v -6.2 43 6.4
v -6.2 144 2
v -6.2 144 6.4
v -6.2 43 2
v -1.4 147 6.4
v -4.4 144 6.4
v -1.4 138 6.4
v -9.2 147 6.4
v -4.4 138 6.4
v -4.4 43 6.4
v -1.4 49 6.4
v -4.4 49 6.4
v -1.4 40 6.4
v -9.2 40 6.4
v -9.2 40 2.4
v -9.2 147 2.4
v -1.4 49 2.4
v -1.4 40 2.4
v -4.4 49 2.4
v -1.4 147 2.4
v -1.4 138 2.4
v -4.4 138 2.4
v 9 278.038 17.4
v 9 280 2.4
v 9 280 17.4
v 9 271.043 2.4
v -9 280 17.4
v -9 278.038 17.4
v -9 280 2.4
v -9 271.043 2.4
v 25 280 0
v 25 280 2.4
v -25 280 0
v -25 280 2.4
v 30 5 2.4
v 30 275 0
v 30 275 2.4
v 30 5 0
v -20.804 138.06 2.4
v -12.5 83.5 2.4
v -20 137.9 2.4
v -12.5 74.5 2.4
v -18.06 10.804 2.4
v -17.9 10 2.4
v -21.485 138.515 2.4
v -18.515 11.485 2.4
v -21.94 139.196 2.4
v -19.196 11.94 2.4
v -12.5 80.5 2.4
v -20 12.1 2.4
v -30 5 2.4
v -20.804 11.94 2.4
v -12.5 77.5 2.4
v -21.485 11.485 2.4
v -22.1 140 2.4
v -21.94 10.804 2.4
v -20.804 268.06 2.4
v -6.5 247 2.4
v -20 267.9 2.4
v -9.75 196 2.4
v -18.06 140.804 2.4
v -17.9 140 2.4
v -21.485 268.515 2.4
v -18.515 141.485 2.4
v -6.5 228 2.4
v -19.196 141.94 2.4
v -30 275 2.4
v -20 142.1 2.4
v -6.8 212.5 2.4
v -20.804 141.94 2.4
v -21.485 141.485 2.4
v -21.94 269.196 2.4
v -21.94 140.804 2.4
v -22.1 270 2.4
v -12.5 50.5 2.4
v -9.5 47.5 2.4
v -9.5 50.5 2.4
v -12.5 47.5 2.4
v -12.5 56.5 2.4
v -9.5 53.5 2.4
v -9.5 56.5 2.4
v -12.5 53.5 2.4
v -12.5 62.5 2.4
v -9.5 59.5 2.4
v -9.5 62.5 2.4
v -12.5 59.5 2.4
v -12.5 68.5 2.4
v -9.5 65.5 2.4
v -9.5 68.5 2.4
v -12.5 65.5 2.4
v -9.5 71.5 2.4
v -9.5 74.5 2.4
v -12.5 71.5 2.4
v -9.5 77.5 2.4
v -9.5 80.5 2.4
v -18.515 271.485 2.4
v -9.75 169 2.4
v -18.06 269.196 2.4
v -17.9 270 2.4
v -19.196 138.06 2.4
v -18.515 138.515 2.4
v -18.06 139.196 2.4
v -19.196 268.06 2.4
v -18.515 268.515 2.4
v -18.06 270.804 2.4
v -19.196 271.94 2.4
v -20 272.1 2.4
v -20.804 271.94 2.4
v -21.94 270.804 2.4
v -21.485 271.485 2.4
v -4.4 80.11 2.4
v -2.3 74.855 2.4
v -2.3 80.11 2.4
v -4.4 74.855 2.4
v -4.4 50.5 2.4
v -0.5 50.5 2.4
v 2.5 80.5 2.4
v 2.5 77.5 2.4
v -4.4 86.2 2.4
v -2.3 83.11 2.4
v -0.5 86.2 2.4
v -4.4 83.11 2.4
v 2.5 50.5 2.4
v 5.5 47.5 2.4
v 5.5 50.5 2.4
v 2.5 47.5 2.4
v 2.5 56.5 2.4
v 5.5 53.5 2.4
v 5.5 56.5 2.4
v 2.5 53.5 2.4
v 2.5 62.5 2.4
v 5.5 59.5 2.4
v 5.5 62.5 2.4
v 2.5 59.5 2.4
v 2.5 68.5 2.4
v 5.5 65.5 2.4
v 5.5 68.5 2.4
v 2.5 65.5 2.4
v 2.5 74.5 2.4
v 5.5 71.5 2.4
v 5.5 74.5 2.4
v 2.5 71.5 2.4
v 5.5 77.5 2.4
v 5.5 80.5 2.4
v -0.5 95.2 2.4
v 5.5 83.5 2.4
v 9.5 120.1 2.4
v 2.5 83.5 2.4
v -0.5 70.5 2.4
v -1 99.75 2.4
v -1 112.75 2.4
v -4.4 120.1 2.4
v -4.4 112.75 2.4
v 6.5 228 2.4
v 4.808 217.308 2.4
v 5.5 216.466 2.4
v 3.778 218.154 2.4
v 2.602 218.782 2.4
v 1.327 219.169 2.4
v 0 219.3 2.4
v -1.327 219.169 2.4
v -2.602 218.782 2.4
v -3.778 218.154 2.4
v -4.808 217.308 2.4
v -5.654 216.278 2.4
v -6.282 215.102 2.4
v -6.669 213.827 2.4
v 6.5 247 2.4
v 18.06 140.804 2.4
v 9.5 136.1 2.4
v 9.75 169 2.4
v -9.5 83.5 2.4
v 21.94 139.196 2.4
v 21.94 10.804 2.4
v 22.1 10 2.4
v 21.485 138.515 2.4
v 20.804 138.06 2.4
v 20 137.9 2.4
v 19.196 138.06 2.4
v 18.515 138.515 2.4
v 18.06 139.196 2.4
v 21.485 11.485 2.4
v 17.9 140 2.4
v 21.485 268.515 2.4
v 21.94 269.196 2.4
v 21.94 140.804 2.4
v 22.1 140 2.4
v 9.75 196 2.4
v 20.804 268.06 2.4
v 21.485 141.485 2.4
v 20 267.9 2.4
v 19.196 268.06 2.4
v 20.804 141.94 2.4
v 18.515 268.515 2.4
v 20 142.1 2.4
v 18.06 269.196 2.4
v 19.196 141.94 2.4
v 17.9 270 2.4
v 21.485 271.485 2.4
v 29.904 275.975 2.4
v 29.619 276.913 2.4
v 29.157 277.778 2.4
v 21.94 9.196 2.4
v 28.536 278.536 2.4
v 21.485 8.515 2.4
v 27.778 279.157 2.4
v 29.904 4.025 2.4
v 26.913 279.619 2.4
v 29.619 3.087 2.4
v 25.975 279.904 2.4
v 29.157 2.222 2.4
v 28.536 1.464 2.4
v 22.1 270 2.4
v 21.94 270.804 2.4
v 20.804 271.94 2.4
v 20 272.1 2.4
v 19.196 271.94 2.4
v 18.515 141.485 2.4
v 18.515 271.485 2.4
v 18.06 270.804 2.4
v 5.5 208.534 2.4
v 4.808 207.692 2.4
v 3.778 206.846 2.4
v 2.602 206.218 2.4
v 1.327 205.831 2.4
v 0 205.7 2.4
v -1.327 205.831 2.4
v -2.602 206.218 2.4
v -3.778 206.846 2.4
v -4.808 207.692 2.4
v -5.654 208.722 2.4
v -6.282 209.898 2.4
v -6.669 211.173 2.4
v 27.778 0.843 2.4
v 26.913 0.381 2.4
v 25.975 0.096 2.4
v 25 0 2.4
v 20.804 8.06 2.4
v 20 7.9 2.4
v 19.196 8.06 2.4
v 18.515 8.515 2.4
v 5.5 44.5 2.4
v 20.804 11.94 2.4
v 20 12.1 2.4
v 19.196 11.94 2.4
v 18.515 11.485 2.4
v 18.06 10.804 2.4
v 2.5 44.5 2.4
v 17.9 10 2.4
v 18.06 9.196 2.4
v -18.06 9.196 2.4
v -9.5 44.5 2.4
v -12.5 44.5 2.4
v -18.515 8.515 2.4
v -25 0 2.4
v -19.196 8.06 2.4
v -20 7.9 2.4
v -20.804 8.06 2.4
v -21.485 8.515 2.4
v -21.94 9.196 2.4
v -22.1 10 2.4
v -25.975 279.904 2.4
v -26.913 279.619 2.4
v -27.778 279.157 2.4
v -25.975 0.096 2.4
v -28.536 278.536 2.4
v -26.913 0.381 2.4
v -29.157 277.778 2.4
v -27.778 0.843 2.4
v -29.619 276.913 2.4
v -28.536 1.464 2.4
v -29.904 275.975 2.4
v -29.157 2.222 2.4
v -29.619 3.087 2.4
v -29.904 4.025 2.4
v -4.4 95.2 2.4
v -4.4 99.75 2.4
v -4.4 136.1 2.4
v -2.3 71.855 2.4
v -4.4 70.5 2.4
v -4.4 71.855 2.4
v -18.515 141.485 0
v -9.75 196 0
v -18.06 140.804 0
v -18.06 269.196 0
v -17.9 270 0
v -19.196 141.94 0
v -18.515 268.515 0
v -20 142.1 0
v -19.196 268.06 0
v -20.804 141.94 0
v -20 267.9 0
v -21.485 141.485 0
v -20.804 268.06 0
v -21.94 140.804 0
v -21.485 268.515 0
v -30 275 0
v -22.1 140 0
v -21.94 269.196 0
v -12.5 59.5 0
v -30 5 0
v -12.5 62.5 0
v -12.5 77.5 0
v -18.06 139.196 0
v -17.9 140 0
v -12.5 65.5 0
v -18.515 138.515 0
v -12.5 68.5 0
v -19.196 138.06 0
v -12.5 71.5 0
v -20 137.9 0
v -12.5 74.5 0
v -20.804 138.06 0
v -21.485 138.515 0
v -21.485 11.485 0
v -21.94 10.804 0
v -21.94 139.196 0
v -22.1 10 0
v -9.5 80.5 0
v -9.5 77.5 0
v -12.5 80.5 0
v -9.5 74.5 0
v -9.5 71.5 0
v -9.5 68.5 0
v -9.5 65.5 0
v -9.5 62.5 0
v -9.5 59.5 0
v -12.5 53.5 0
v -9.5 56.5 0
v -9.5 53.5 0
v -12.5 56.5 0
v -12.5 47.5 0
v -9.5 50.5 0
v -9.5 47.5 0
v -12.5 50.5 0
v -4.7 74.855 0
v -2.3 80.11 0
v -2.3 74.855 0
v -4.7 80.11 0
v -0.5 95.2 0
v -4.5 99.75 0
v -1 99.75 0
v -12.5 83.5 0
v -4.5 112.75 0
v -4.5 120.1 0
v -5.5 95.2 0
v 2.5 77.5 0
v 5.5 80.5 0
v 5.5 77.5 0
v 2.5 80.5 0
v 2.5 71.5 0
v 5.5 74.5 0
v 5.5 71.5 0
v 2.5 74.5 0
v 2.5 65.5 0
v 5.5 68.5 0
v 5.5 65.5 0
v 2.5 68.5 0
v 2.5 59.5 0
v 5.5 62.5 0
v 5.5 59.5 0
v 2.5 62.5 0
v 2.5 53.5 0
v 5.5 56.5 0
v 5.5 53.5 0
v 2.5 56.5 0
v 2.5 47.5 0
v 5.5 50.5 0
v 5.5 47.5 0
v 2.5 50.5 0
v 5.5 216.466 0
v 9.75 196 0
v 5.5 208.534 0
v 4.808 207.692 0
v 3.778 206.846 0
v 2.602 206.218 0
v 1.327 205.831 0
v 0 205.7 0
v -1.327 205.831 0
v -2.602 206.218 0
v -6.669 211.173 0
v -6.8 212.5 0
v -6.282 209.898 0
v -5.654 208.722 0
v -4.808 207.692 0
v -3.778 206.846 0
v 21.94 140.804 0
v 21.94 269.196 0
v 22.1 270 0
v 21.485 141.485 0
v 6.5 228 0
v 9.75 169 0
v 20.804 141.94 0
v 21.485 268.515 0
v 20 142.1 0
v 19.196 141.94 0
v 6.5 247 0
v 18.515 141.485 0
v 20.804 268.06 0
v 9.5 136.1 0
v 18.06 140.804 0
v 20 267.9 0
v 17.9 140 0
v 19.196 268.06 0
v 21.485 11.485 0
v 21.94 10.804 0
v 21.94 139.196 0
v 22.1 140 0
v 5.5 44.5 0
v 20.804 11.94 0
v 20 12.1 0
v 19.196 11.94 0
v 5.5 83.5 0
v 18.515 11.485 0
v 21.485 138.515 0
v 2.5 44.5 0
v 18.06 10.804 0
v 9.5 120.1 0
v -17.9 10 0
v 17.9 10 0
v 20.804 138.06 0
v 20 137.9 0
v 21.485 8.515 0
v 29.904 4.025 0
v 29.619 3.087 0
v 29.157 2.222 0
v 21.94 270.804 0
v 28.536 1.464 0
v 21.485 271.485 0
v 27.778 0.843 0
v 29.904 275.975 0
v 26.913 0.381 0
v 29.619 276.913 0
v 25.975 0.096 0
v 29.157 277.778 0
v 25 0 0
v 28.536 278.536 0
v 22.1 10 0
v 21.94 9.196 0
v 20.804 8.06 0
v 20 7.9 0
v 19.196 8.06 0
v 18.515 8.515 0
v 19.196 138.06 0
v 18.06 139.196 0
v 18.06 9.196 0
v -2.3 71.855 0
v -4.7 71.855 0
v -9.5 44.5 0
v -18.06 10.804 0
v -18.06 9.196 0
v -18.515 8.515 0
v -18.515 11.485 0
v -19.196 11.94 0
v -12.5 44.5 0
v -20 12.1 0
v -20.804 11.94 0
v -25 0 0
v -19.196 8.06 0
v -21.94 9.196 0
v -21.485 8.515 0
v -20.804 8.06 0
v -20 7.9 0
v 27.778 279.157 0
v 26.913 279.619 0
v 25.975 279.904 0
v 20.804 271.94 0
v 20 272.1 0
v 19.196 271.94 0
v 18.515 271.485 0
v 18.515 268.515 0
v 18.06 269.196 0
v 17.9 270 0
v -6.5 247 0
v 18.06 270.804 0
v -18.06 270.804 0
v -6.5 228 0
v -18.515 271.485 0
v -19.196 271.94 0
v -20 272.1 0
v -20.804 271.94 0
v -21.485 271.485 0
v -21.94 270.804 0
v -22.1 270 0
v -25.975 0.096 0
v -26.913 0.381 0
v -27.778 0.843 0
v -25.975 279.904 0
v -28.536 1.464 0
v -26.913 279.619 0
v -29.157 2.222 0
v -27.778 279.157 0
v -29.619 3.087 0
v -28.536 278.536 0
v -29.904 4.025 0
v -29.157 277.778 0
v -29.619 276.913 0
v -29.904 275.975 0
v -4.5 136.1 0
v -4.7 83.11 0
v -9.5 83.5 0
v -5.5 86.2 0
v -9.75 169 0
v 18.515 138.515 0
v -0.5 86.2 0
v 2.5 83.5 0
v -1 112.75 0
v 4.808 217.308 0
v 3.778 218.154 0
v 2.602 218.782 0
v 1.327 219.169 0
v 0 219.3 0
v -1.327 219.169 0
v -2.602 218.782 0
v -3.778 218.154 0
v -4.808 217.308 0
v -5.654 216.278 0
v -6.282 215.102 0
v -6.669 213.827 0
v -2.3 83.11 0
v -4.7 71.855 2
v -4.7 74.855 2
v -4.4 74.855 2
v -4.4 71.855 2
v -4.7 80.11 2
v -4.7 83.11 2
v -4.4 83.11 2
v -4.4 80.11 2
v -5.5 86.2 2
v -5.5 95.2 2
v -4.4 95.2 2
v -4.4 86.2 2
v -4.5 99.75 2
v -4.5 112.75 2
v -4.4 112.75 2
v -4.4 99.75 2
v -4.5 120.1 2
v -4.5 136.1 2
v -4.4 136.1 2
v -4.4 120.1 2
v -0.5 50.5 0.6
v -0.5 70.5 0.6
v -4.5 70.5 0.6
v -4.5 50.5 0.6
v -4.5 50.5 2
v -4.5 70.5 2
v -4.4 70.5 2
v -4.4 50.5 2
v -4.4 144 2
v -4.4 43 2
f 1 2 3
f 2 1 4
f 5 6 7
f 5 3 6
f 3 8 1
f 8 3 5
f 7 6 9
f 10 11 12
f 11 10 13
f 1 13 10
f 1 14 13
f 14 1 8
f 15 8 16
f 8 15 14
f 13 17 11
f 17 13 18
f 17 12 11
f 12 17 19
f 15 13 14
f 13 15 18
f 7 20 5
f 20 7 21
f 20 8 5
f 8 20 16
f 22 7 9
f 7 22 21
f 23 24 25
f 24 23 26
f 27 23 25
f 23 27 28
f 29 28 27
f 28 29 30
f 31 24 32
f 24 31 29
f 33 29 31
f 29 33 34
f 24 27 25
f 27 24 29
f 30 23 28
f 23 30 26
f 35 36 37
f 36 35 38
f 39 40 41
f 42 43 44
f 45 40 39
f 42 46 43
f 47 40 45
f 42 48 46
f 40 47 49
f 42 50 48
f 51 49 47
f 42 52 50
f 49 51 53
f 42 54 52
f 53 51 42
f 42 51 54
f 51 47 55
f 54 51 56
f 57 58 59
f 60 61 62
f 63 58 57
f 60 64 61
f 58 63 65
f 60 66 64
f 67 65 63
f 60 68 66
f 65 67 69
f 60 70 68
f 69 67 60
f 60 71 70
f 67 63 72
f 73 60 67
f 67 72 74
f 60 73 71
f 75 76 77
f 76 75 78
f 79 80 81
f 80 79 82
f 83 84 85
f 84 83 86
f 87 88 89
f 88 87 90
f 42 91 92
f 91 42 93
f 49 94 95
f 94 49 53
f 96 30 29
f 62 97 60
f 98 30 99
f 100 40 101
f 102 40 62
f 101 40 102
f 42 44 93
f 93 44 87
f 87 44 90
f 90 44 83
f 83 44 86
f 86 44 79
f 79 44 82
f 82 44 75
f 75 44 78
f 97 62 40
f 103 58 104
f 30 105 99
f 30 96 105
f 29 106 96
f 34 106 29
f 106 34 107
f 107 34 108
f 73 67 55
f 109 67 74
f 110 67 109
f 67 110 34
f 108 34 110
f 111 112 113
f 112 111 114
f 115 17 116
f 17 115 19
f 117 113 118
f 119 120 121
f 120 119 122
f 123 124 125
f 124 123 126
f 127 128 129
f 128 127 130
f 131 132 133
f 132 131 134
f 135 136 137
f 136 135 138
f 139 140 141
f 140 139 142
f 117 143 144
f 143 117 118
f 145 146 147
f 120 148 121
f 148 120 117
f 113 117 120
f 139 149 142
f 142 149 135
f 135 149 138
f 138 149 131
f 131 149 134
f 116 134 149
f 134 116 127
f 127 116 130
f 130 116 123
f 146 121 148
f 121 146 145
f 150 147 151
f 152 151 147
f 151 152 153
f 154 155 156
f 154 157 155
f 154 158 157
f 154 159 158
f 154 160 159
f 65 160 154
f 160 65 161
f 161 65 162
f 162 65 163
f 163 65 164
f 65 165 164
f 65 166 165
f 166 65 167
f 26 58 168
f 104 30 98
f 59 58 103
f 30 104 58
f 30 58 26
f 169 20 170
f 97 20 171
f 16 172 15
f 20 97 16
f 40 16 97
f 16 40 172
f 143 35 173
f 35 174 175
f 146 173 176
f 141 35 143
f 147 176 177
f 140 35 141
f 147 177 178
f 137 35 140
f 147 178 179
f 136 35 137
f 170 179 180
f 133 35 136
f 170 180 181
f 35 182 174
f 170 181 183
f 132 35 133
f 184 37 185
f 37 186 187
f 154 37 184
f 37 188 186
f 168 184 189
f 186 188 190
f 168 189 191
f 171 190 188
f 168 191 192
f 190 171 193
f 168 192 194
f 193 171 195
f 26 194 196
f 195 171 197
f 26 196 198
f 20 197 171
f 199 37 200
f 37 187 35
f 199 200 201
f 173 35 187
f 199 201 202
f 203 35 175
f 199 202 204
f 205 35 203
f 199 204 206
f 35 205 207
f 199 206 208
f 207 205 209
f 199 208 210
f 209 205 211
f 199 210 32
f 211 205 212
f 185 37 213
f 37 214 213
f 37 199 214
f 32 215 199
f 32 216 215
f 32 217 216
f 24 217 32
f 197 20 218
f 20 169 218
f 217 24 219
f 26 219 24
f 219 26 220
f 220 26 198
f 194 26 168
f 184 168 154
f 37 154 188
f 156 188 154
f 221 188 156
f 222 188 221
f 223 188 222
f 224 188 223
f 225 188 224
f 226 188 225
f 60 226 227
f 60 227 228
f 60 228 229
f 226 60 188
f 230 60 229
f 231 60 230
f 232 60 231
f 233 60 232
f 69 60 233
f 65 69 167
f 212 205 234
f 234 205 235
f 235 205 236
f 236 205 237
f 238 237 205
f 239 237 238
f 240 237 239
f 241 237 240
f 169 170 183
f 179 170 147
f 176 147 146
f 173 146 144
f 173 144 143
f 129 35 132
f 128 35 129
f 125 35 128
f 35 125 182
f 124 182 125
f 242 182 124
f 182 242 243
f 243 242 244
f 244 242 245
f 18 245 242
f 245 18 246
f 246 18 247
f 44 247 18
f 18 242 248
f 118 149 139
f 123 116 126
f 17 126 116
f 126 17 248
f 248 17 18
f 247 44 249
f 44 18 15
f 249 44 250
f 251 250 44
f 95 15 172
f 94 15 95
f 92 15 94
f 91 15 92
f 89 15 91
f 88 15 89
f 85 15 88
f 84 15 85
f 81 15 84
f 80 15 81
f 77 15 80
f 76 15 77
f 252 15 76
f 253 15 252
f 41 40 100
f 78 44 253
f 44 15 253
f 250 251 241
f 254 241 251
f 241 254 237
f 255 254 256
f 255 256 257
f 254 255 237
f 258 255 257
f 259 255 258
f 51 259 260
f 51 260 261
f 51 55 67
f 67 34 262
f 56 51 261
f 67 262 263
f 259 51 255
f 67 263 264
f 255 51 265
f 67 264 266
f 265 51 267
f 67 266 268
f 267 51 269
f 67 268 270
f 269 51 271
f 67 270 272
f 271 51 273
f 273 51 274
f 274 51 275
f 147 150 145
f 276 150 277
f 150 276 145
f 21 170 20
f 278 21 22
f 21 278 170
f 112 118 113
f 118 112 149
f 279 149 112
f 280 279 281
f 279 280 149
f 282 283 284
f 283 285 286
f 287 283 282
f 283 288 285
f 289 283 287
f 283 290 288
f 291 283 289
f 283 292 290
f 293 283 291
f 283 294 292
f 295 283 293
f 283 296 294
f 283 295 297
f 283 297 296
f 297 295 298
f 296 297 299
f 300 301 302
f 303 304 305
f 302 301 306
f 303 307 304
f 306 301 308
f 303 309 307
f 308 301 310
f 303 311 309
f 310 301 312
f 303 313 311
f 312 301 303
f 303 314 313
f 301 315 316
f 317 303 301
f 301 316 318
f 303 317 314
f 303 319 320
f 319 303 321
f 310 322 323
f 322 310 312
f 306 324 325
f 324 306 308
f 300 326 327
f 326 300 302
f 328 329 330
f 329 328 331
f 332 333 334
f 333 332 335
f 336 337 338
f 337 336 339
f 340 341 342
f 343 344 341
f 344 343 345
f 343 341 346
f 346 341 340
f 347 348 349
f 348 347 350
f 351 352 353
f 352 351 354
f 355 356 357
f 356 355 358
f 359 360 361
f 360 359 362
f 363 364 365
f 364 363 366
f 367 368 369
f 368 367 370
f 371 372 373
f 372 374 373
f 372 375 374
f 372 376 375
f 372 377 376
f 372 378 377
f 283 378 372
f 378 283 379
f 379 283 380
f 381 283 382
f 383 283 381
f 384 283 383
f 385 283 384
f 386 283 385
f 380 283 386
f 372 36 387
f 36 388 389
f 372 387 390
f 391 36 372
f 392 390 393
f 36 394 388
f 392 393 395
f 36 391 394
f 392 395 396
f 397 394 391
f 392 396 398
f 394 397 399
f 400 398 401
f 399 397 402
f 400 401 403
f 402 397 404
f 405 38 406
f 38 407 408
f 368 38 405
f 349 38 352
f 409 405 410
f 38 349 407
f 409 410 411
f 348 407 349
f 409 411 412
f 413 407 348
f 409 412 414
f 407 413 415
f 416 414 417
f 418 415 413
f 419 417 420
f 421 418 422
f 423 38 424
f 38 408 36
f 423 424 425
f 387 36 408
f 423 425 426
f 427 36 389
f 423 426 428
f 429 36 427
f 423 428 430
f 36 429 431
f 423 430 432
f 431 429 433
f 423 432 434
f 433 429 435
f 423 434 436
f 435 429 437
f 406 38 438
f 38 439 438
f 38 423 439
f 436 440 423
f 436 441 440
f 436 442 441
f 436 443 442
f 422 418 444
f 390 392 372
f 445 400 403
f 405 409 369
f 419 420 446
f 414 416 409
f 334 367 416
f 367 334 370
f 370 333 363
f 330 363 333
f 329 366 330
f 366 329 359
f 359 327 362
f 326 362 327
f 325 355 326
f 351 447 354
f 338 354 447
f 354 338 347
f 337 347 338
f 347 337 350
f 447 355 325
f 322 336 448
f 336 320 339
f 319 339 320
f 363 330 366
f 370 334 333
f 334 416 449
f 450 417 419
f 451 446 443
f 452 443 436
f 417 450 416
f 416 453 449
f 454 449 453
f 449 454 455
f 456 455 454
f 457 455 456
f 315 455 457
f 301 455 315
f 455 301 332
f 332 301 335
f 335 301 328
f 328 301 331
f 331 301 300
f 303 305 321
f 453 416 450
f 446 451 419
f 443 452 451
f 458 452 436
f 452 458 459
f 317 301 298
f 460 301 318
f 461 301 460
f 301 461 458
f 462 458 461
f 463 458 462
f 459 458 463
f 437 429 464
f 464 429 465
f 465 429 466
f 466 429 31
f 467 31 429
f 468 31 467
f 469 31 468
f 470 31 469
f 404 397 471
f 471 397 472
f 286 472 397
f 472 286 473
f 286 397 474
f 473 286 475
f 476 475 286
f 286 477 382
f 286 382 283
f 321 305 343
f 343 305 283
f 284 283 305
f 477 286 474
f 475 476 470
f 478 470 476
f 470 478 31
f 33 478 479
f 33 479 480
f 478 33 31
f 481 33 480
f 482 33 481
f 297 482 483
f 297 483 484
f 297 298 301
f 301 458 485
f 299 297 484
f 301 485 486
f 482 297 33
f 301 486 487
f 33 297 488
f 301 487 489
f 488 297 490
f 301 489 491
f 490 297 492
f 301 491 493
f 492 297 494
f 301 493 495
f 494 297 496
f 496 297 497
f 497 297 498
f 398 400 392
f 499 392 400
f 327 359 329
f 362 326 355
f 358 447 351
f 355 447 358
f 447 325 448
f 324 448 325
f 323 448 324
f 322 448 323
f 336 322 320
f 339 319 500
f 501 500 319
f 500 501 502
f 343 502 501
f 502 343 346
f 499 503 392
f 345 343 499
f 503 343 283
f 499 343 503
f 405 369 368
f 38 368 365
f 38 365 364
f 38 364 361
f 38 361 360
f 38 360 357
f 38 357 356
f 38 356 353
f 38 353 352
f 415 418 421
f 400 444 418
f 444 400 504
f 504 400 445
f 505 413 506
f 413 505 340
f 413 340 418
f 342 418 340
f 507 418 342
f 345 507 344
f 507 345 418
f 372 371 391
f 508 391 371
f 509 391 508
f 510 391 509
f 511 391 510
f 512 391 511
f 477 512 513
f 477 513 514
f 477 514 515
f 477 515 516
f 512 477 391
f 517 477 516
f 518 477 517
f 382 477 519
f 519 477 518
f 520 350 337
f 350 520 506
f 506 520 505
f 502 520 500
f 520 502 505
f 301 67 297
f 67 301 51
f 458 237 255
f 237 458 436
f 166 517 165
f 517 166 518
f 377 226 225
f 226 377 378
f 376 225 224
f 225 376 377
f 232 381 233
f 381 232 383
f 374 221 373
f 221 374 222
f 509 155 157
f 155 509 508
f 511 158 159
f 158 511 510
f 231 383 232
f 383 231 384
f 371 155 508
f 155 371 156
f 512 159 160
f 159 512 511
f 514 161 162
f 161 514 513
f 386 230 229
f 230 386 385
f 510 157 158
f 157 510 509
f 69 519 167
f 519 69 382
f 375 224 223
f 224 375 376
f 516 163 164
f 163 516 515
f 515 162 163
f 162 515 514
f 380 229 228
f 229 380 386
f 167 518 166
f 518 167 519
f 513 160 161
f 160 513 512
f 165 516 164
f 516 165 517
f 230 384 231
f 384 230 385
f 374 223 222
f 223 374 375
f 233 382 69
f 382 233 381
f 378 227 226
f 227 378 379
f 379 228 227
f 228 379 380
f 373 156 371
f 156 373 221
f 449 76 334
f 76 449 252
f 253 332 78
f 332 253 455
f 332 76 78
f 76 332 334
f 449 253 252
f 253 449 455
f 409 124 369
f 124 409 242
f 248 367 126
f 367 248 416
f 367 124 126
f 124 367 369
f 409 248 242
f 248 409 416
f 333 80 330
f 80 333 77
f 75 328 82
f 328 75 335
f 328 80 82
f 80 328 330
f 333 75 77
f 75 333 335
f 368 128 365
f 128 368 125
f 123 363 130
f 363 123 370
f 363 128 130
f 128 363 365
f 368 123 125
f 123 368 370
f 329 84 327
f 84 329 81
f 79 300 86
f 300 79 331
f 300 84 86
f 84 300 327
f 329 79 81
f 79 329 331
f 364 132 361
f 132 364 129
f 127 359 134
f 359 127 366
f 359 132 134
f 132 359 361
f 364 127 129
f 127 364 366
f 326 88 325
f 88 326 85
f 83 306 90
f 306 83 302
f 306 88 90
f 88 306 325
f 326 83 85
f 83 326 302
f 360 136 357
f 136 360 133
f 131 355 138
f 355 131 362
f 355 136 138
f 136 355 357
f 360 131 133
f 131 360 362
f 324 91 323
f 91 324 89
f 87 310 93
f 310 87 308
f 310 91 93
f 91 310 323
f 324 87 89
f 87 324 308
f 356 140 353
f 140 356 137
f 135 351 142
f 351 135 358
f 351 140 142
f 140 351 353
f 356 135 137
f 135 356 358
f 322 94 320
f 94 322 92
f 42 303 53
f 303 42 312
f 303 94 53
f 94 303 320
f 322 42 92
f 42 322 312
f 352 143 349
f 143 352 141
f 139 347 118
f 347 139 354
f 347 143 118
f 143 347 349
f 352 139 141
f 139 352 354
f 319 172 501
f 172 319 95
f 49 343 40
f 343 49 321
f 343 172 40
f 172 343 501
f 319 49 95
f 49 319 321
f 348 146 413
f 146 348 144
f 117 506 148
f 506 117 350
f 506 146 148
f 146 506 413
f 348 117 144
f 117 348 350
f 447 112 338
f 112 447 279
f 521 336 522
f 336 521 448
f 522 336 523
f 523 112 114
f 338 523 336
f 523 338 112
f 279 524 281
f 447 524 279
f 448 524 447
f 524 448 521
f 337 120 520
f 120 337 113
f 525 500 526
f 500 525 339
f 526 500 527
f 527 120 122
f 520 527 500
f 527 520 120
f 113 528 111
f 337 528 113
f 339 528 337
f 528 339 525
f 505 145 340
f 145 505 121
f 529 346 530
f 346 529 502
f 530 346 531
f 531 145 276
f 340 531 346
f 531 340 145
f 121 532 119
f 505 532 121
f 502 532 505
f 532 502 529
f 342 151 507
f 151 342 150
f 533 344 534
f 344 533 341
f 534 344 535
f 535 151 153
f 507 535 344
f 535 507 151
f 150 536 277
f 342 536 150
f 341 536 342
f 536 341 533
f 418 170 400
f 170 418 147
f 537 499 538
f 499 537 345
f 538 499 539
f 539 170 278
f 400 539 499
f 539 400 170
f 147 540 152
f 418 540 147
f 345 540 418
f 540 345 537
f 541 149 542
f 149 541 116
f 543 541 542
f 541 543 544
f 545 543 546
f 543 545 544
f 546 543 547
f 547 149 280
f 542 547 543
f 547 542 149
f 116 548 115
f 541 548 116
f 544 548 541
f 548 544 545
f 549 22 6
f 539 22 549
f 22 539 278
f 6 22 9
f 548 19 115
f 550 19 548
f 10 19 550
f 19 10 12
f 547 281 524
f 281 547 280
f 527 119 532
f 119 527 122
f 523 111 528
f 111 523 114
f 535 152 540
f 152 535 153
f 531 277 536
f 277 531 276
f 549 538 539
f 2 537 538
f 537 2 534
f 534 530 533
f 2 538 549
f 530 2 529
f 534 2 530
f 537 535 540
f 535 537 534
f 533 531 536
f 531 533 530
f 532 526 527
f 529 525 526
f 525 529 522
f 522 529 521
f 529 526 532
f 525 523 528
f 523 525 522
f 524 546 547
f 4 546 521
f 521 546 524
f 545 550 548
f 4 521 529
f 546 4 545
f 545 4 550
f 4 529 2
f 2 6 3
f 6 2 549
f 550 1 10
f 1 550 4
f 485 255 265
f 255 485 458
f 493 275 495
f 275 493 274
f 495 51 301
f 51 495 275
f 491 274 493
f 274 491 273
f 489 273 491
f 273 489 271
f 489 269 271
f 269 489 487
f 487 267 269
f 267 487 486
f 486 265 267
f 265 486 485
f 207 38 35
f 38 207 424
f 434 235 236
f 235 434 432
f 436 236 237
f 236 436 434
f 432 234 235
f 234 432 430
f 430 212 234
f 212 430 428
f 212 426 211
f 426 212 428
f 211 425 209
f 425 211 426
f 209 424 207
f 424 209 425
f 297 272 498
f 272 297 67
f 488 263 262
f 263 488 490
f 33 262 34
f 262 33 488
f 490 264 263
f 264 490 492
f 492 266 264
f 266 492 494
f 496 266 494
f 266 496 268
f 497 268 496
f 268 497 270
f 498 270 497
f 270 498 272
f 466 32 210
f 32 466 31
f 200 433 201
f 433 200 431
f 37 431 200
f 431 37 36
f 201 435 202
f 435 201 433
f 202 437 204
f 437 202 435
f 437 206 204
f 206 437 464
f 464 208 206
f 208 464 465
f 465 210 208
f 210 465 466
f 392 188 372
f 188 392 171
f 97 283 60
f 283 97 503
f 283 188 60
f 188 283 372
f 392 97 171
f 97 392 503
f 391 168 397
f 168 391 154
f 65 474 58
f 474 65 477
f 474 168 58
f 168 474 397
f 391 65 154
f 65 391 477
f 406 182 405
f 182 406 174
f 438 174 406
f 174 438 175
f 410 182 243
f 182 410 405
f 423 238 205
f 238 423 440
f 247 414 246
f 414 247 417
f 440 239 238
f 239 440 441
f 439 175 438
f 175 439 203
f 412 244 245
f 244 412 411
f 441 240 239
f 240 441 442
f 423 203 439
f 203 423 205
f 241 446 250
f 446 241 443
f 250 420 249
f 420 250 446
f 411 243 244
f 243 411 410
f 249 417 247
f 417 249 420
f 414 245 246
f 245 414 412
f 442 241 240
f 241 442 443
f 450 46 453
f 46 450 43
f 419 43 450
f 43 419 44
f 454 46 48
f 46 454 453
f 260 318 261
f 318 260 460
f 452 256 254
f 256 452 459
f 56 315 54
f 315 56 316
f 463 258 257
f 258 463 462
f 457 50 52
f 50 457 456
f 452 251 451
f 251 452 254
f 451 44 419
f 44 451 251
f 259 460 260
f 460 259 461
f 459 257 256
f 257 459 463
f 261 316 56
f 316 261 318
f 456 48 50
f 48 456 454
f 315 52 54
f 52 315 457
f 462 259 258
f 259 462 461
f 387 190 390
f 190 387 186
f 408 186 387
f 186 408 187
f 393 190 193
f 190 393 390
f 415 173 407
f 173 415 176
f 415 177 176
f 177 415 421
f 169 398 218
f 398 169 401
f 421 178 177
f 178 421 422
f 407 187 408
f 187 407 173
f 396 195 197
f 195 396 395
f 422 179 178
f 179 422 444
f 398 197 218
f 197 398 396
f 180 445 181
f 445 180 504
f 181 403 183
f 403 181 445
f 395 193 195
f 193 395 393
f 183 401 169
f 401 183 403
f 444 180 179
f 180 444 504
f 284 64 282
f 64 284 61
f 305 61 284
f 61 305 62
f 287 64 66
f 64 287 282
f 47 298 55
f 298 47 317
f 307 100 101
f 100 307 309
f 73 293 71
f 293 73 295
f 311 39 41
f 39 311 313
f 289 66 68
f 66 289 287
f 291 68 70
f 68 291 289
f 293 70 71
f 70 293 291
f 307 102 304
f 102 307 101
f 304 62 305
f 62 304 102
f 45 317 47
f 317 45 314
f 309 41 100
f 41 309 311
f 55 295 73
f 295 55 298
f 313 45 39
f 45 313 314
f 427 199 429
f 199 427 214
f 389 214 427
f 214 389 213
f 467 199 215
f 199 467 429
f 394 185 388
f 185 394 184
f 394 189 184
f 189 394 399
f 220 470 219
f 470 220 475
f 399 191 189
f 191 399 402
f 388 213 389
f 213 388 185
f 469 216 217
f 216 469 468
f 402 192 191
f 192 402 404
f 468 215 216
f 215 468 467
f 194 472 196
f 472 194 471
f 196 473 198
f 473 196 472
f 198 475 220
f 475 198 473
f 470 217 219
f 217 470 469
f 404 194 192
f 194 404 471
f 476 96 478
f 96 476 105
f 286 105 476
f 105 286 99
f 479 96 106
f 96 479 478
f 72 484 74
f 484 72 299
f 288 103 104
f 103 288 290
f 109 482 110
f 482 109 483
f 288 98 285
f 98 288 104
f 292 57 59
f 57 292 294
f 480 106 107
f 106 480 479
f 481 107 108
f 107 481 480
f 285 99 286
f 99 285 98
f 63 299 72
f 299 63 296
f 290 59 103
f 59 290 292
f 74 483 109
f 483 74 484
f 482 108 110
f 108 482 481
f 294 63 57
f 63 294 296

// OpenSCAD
/* [Hidden] */
// Kossel mains inlet panel and Duet mount

/* [Options] */

// Which type of Duet will you be using?
Wifi=0;		// [0: Ethernet Duet 0.8.5 or Duet 0.6,1:Duet WiFi]

/* [Hidden] */

length=280;
height=60;
thickness=2.4;	// change to be a multippe of your printing latewr height

// The reference point for all of the following is the top side of the corner of the PCB that is
// closest to the extruder heater connector(s).
// xxxOffset is the height of the bottom of the cutout above the top surface of the PCB.
// xxxPos is the distance from the centre of the cutout to the corner of the board.

inletOffset=220-(355-280)/2;
duetYOffset=81 - (355-length)/2;
duetTopXOffset=-10+5.5;

pbHeight=2.4;
pbWidth=3;
pbOffset=-0.2;
pbPos1=29.855;
pbPos2=38.11;

usbHeight=5;
usbWidth=9;
usbOffset=-1;
usbPos=47.2;

sdHeight= 3.5;
sdWidth=13;
sdOffset=0;
sdPos=62.75;

ethernetHeight=14;
ethernetWidth=16;
ethernetOffset=0;
ethernetPos=84.6;

wifiHeight=1.8;
wifiWidth=18;
wifiOffset=-0.2;
wifiPos=81.6;

ribThickness=3;
ribHeight=4;
pcbThick=1.6;
pcbClear=0.1;
pcbWidth=100;
pcbWclear=0.5;

round=5;
m4ClearRad=2.1;

overlap=0.02;

module fuseCutout() {
	translate([0,0,-overlap])
		difference() {
			cylinder(r=6.8,h=thickness+2*overlap,$fn=32);
			translate([5.5,-10,-overlap]) cube([20,20,thickness+4*overlap]);
		}
}

module switchCutout() {
	union() {
		cube([13,19,10], center=true);
	}
}

module inletCutout() {
	union() {
		cube([19.5,27,10], center=true);
	}
}

// Finger guard is aligned with right side at Y=0
module fingerGuard() {
	translate([-9,-10,0])
		difference() {
			cube([18,10,15+overlap]);
			translate([-1,-10,0]) rotate([-25,0,0]) cube([20,10,50]);
		}
}

module roundCorner(radius, height) {
	difference() {
		cube([radius+2,radius+2,height]);
		translate([0,0,-overlap]) cylinder(r=radius,h=height+2*overlap,$fn=32);
	}
}

// Duet connector cutout, referenced to the bottom corner and the top of the PCB
module duetCutouts() {
	// push buttons
	translate([pbOffset + pbHeight/2,pbPos1,-overlap]) cube([pbHeight,pbWidth,10], center=true);
	translate([pbOffset + pbHeight/2,pbPos2,-overlap]) cube([pbHeight,pbWidth,10], center=true);
	// USB connector
	translate([usbOffset + usbHeight/2,usbPos,-overlap]) cube([usbHeight,usbWidth,20], center=true);
	// SD card
	translate([sdOffset + sdHeight/2,sdPos,-overlap]) cube([sdHeight,sdWidth,10], center=true);
	// Ethernet or Wifi
	if (Wifi) {
		translate([wifiOffset + wifiHeight/2,wifiPos,-overlap])
			cube([wifiHeight,wifiWidth,10], center=true);
	} else {
		translate([ethernetOffset + ethernetHeight/2,ethernetPos,-overlap])
			cube([ethernetHeight,ethernetWidth,10], center=true);
	}
	// LEDs
	translate([0,7,0.6]) cube([4,20,10]);
	// Board
	translate([-pcbThick-pcbClear,-pcbWclear,2.0])
		cube([pcbThick+2*pcbClear,pcbWidth+2*pcbWclear, 10]);
	// Ventilation holes
	for(y=[1:6:40])
		for(x=[-8,7])
			translate([x,y,-overlap])
				cube([3,3,10]);
}

module duetRibs() {
	translate([-pcbThick-pcbClear-ribThickness,-overlap,thickness-overlap])
		cube([ribThickness,pcbWidth+pcbWclear+2*overlap,ribHeight+overlap]);

	translate([-ribThickness-pcbThick-pcbClear,-ribThickness-pcbWclear,thickness-overlap])
		cube([pcbThick+2*ribThickness+2*pcbClear,6+ribThickness,ribHeight+overlap]);
	translate([-ribThickness-pcbThick-pcbClear,pcbWidth+pcbWclear-6,thickness-overlap])
		cube([pcbThick+2*ribThickness+2*pcbClear,6+ribThickness,ribHeight+overlap]);
}

difference() {
	union() {
		translate([-height/2,0,0]) cube([height,length,thickness]);
		translate([duetTopXOffset,duetYOffset, 0]) duetRibs();
		translate([0,length,thickness-overlap]) fingerGuard();
	}
	translate([0,inletOffset,0]) inletCutout();
	translate([0,inletOffset+30,0]) fuseCutout();
	translate([0,inletOffset+55,0]) switchCutout();

	translate([duetTopXOffset,duetYOffset,0]) duetCutouts();

	// Screw holes
	translate([20,10,-overlap]) cylinder(r=m4ClearRad,h=thickness+2*overlap, $fn=16);
	translate([-20,10,-overlap]) cylinder(r=m4ClearRad,h=thickness+2*overlap, $fn=16);
	translate([20,length/2,-overlap]) cylinder(r=m4ClearRad,h=thickness+2*overlap, $fn=16);
	translate([-20,length/2,-overlap]) cylinder(r=m4ClearRad,h=thickness+2*overlap, $fn=16);
	translate([20,length-10,-overlap]) cylinder(r=m4ClearRad,h=thickness+2*overlap, $fn=16);
	translate([-20,length-10,-overlap]) cylinder(r=m4ClearRad,h=thickness+2*overlap, $fn=16);

	// Corners
	translate([-height/2+round,round,-overlap])
		rotate([0,0,180]) roundCorner(round,thickness+2*overlap);
	translate([height/2-round,round,-overlap])
		rotate([0,0,-90]) roundCorner(round,thickness+2*overlap);
	translate([-height/2+round,length-round,-overlap])
		rotate([0,0,90]) roundCorner(round,thickness+2*overlap);
	translate([height/2-round,length-round,-overlap])
		rotate([0,0,0]) roundCorner(round,thickness+2*overlap);
}
